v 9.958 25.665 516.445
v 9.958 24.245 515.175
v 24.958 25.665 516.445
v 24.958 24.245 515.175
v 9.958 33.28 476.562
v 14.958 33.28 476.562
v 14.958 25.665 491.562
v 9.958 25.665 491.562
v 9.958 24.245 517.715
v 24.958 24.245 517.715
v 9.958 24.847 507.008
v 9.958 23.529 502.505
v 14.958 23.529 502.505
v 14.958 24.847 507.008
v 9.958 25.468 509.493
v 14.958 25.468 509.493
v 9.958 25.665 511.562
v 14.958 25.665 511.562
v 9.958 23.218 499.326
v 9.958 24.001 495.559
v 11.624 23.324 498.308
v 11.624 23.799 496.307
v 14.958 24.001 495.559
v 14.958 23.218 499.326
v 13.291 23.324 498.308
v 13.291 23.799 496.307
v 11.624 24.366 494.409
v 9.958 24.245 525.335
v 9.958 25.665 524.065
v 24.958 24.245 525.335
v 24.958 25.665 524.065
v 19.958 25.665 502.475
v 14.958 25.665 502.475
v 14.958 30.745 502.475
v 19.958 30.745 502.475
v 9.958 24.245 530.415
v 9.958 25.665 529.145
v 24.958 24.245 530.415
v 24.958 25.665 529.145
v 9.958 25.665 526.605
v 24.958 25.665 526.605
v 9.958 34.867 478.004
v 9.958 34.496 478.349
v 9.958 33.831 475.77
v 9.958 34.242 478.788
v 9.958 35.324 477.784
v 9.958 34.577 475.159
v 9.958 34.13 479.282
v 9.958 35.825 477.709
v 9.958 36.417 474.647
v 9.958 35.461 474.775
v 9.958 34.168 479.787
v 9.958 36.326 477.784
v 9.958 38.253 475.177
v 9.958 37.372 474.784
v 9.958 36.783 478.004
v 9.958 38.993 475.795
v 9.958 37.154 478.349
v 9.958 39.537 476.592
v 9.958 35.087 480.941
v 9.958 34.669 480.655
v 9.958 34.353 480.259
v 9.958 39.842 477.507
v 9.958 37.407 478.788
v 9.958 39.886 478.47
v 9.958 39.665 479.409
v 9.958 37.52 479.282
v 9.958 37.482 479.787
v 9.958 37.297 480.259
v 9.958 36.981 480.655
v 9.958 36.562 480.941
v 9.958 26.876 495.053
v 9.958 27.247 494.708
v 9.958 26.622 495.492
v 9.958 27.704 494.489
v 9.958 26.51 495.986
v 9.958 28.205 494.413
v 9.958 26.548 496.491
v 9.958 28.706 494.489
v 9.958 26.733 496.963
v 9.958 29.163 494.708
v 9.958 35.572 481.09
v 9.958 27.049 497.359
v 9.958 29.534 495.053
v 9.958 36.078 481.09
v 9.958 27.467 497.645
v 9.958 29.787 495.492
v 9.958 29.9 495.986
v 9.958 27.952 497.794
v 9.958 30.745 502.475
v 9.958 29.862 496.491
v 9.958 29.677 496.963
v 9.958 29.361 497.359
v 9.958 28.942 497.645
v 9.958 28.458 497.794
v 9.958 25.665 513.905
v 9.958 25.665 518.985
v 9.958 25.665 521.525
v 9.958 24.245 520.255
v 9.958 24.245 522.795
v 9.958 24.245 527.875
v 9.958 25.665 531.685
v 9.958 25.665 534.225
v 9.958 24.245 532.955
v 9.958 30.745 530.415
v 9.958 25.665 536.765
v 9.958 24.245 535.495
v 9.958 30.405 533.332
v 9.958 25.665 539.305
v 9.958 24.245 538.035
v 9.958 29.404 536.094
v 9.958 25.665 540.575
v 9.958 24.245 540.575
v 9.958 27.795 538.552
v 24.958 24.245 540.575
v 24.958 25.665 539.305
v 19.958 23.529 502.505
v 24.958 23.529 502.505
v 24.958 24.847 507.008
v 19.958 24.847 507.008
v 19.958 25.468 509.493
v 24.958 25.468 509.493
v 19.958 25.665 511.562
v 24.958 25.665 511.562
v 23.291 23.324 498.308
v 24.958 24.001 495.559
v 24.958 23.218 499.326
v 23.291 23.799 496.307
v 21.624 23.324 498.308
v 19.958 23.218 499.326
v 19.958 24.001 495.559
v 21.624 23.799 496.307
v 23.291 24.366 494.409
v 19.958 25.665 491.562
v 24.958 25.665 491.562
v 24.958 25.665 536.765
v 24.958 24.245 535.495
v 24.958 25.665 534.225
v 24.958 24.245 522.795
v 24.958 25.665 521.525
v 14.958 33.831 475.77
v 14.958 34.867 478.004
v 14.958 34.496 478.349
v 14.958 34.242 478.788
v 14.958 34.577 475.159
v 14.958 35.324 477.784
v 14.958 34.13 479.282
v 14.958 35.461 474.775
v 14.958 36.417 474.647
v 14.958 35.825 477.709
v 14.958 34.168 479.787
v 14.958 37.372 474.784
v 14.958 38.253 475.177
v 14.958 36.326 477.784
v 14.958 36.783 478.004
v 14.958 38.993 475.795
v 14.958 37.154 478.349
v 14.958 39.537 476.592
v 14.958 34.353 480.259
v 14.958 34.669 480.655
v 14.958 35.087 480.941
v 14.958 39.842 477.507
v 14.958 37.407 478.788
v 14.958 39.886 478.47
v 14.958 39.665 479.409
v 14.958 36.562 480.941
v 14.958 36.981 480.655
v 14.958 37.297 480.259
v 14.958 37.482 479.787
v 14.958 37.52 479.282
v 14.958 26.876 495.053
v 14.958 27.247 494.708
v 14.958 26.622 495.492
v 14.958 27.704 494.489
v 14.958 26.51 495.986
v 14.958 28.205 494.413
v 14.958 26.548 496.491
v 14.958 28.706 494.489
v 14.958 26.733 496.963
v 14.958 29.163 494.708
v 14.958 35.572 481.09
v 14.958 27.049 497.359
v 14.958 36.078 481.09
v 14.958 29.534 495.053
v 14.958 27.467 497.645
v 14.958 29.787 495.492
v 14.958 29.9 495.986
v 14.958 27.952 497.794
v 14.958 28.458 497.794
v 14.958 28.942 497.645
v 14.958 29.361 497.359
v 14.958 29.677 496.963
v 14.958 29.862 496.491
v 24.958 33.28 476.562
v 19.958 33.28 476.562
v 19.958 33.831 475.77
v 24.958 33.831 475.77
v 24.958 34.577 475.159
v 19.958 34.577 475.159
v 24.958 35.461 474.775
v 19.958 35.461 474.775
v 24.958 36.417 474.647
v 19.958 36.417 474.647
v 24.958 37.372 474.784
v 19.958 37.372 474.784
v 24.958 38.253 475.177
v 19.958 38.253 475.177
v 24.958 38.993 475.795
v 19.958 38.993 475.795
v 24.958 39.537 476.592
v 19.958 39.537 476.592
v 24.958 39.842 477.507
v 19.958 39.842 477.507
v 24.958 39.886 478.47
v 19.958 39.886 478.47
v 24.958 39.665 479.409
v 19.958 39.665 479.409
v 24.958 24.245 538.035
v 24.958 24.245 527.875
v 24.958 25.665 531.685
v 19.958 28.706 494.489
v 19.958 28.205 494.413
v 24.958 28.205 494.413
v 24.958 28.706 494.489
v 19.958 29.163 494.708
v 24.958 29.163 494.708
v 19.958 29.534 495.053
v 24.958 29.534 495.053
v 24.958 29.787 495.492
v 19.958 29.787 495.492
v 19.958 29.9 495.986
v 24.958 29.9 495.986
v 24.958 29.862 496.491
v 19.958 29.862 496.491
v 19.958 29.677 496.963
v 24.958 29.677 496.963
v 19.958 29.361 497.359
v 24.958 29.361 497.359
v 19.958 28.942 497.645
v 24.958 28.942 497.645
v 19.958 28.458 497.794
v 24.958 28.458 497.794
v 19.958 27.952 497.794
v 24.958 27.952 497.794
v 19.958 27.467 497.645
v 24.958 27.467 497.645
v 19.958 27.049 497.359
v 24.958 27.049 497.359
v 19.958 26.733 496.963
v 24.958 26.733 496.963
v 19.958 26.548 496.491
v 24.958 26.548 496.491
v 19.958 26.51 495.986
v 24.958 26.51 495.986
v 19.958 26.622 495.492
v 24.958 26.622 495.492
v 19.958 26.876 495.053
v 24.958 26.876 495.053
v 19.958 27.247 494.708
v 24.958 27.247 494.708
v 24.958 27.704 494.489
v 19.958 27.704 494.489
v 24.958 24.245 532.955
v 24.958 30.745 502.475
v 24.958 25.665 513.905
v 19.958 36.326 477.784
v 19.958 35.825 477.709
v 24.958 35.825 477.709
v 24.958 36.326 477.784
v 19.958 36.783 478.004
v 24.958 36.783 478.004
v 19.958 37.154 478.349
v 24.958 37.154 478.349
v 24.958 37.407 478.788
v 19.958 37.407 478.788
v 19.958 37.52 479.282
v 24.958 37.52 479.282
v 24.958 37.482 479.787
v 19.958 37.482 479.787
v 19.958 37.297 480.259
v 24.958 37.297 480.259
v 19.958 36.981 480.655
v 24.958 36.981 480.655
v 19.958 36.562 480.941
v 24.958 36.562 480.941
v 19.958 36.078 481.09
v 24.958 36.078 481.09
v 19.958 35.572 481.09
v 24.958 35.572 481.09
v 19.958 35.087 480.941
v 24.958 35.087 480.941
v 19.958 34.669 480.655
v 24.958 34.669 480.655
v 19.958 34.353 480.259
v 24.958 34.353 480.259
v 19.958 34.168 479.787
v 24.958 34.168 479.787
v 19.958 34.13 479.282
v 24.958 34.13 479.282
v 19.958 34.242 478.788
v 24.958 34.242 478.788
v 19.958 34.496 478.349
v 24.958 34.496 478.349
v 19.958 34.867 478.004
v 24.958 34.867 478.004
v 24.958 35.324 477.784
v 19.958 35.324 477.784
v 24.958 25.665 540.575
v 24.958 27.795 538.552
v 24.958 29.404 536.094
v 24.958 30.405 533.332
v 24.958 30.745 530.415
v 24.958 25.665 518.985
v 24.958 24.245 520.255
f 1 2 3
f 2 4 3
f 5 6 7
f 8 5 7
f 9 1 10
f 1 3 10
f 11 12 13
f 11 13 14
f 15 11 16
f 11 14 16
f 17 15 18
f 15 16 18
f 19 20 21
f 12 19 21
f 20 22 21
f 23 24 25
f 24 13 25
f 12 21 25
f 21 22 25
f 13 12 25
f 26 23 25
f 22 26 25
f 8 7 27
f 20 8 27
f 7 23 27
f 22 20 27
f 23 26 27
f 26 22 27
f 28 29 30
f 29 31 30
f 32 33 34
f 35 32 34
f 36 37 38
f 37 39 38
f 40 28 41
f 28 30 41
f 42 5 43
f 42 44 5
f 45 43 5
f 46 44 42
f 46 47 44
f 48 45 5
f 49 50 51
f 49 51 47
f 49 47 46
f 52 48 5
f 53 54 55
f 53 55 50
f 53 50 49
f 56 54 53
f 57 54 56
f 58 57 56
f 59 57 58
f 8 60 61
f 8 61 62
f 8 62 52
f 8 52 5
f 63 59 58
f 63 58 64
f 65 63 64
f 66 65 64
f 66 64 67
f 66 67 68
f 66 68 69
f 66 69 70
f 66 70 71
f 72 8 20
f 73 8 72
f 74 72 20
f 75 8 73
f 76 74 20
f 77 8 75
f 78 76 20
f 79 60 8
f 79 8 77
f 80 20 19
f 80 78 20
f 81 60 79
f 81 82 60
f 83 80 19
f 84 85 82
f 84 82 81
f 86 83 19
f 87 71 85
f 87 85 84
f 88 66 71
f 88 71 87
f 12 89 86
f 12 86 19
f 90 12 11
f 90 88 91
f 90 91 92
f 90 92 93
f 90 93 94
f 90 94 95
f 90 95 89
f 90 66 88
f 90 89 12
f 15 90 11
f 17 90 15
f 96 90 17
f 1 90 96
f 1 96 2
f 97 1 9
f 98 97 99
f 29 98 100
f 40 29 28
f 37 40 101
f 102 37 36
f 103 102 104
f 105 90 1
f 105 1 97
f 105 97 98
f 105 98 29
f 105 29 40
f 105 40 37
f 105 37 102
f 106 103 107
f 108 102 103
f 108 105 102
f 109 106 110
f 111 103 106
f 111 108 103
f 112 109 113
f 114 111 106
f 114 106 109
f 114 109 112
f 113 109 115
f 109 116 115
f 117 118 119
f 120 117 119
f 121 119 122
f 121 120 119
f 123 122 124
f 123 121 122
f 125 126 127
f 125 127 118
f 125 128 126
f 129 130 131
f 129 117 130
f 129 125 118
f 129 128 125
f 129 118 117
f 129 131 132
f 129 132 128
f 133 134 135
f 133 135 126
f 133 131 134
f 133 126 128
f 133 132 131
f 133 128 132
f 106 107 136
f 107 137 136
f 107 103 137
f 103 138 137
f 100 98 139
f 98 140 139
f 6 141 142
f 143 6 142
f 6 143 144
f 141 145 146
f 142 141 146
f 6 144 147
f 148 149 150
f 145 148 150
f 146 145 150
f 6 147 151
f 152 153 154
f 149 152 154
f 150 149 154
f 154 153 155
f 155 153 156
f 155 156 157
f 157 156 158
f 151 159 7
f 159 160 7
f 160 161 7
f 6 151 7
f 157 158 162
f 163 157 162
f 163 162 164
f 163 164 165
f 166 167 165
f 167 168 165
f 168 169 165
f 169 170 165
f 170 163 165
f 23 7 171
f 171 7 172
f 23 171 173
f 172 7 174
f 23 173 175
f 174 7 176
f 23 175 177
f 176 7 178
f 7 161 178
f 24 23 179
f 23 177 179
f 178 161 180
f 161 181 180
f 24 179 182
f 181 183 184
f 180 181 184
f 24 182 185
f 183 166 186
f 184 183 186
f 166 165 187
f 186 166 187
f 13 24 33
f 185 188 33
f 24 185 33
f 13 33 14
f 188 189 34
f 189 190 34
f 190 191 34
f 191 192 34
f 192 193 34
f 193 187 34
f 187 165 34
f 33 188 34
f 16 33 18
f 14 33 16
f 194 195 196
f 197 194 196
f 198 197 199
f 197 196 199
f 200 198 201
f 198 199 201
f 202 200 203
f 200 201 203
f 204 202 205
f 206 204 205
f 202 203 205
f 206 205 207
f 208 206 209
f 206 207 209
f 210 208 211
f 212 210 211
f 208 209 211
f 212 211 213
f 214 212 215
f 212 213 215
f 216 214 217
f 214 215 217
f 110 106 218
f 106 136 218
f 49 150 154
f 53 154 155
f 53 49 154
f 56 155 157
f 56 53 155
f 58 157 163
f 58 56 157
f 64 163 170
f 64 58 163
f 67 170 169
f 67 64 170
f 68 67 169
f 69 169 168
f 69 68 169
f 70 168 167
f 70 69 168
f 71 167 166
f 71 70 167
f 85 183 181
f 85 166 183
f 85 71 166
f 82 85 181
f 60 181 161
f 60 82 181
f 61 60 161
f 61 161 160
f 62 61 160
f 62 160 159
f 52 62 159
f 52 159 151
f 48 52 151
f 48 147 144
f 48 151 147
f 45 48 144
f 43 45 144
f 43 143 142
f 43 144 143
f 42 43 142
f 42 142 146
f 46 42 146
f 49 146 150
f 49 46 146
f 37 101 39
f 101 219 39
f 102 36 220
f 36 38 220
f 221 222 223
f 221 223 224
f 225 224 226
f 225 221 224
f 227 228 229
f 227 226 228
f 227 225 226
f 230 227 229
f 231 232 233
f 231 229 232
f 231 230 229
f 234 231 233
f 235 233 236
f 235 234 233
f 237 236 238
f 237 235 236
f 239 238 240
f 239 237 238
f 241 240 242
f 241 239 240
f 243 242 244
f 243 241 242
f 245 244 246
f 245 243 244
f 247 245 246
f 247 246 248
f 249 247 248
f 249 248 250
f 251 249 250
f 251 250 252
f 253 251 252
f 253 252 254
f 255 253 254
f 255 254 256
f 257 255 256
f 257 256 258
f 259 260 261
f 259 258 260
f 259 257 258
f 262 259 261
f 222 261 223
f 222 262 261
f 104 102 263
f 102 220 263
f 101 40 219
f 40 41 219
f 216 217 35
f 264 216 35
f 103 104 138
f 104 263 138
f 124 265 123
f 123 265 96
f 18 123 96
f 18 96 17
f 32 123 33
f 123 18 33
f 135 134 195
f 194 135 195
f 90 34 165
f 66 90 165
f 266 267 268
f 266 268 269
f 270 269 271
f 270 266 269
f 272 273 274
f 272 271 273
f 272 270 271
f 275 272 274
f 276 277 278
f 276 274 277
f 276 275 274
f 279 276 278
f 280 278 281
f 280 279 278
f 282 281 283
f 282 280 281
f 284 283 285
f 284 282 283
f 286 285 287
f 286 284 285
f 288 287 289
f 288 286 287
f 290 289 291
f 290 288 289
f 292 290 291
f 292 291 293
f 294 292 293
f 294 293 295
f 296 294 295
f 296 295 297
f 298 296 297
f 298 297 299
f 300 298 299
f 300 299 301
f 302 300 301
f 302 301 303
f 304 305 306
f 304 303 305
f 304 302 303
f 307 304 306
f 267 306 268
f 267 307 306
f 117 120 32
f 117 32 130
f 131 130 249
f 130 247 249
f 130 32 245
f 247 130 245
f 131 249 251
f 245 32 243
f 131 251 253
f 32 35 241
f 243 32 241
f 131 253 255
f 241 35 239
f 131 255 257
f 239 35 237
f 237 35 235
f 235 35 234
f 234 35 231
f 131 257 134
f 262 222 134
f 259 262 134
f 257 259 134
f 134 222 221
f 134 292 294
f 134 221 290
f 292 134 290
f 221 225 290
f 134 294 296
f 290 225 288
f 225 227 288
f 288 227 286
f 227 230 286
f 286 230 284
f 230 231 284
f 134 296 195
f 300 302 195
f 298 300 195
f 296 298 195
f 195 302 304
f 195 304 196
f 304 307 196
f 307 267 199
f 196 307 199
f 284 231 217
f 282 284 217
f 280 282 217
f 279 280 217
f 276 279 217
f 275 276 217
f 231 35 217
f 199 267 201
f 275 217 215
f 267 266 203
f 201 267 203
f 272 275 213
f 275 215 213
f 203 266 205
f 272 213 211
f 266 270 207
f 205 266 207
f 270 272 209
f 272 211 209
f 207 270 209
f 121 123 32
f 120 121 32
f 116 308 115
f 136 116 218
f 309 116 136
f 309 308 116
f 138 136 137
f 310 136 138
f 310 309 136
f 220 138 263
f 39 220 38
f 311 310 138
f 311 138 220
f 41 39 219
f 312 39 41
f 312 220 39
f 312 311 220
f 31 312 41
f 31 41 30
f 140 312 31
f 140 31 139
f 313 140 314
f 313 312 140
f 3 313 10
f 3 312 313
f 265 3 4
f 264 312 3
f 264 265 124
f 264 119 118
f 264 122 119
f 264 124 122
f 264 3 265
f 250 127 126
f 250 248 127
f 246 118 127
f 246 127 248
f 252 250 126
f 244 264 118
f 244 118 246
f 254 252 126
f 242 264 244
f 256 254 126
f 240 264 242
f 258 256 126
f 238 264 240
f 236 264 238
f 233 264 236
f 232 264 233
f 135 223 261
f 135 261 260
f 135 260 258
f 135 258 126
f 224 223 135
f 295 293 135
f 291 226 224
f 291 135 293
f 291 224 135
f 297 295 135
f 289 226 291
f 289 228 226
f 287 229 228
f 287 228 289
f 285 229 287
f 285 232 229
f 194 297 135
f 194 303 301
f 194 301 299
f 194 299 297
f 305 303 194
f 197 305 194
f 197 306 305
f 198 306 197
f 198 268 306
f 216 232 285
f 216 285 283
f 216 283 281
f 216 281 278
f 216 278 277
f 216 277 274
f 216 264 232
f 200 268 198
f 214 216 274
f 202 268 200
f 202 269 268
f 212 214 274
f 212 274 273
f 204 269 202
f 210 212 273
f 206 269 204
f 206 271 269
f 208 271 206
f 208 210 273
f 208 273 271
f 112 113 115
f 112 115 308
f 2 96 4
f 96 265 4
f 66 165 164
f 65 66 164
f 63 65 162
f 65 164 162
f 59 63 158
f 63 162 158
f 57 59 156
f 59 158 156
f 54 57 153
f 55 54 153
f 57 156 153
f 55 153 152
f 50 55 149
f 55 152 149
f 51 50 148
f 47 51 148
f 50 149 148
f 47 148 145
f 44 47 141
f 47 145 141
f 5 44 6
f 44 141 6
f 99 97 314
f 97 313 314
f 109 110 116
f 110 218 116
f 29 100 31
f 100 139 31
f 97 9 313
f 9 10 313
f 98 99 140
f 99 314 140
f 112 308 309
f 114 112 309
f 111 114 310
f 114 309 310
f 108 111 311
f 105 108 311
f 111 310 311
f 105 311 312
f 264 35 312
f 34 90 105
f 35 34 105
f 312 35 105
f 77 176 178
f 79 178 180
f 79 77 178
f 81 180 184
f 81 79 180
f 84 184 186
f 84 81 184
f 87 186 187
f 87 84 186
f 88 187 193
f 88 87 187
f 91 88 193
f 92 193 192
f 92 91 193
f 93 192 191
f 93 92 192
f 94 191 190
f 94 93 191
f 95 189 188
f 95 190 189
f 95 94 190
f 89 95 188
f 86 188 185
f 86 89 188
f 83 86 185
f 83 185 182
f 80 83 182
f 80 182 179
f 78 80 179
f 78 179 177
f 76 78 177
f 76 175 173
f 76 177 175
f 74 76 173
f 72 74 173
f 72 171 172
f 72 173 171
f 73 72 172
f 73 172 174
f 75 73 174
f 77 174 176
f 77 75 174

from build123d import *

# Parameters (mm, degrees)
BOSS_EXTRUDE1_DEPTH = 2.54
BOSS_EXTRUDE2_DEPTH = 8.08
BOSS_EXTRUDE3_START = -5
BOSS_EXTRUDE3_DEPTH = 5
BOSS_EXTRUDE4_START = 5
BOSS_EXTRUDE4_DEPTH = 5
SKETCH8_R           = 1.7
CUT_EXTRUDE1_DEPTH  = 543.252698287


with BuildPart() as part:
    # Sketch1 → Boss-Extrude1 (new body)
    with BuildSketch(Plane(origin=(14.957777778, 0, 0), x_dir=(0, 0, -1), z_dir=(1, 0, 0))):
        with BuildLine():
            Line((-496.113012561, 30.744895578), (-521.513012561, 30.744895578))
            Line((-521.513012561, 30.744895578), (-521.513012561, 25.664895578))
            Line((-521.513012561, 25.664895578), (-496.113012561, 25.664895578))
            ThreePointArc((-496.113012561, 25.664895578), (-494.404850963, 26.325059427), (-493.584615771, 27.962388527))
            Line((-493.584615771, 27.962388527), (-480.88314332, 33.756493956))
            ThreePointArc((-480.88314332, 33.756493956), (-477.098018282, 36.879077411), (-481.937324449, 36.067403333))
            Line((-481.937324449, 36.067403333), (-494.6387969, 30.273297904))
            ThreePointArc((-494.6387969, 30.273297904), (-495.339107499, 30.624124991), (-496.113012561, 30.744895578))
        make_face()
    extrude(amount=-BOSS_EXTRUDE1_DEPTH)

    # Sketch2 → Boss-Extrude2 (add)
    with BuildSketch(Plane(origin=(14.957777778, 0, 0), x_dir=(0, 0, -1), z_dir=(1, 0, 0))):
        with BuildLine():
            Line((-513.904615771, 25.664895578), (-502.474615771, 25.664895578))
            Line((-502.474615771, 25.664895578), (-502.474615771, 30.744895578))
            Line((-502.474615771, 30.744895578), (-530.414615771, 30.744895578))
            ThreePointArc((-530.414615771, 30.744895578), (-536.094228434, 29.404120904), (-540.574615771, 25.664895578))
            Line((-540.574615771, 25.664895578), (-540.574615771, 24.244992412))
            Line((-540.574615771, 24.244992412), (-539.304615771, 25.664895578))
            Line((-539.304615771, 25.664895578), (-538.034615771, 24.244992412))
            Line((-538.034615771, 24.244992412), (-536.764615771, 25.664895578))
            Line((-536.764615771, 25.664895578), (-535.494615771, 24.244992412))
            Line((-535.494615771, 24.244992412), (-534.224615771, 25.664895578))
            Line((-534.224615771, 25.664895578), (-532.954615771, 24.244992412))
            Line((-532.954615771, 24.244992412), (-531.684615771, 25.664895578))
            Line((-531.684615771, 25.664895578), (-530.414615771, 24.244992412))
            Line((-530.414615771, 24.244992412), (-529.144615771, 25.664895578))
            Line((-529.144615771, 25.664895578), (-527.874615771, 24.244992412))
            Line((-527.874615771, 24.244992412), (-526.604615771, 25.664895578))
            Line((-526.604615771, 25.664895578), (-525.334615771, 24.244992412))
            Line((-525.334615771, 24.244992412), (-524.064615771, 25.664895578))
            Line((-524.064615771, 25.664895578), (-522.794615771, 24.244992412))
            Line((-522.794615771, 24.244992412), (-521.524615771, 25.664895578))
            Line((-521.524615771, 25.664895578), (-520.254615771, 24.244992412))
            Line((-520.254615771, 24.244992412), (-518.984615771, 25.664895578))
            Line((-518.984615771, 25.664895578), (-517.714615771, 24.244992412))
            Line((-517.714615771, 24.244992412), (-516.444615771, 25.664895578))
            Line((-516.444615771, 25.664895578), (-515.174615771, 24.244992412))
            Line((-515.174615771, 24.244992412), (-513.904615771, 25.664895578))
        make_face()
    extrude(amount=BOSS_EXTRUDE2_DEPTH)

    # Sketch7 → Boss-Extrude3 (add)
    with BuildSketch(Plane(origin=(14.957777778, 0, 0), x_dir=(0, 0, -1), z_dir=(1, 0, 0)).offset(BOSS_EXTRUDE3_START)):
        with BuildLine():
            Line((-502.474615771, 30.744895578), (-479.408927659, 39.66518211))
            ThreePointArc((-479.408927659, 39.66518211), (-474.949798497, 37.8260107), (-476.562112461, 33.279932386))
            Line((-476.562112461, 33.279932386), (-491.562112461, 25.664895578))
            add(Edge.make_bspline(
                [(-491.562112461, 25.664895578), (-494.237137805, 24.306867814), (-495.170436648, 24.128959325), (-502.31030057, 22.103673482), (-507.062112461, 25.664895578), (-511.562112461, 25.664895578)],
                knots=[0, 0, 0, 0, 0.24107407, 0.34107407, 1, 1, 1, 1], degree=3))
            Line((-511.562112461, 25.664895578), (-513.904615771, 25.664895578))
            Line((-513.904615771, 25.664895578), (-515.174615771, 24.244992412))
            Line((-515.174615771, 24.244992412), (-516.444615771, 25.664895578))
            Line((-516.444615771, 25.664895578), (-517.714615771, 24.244992412))
            Line((-517.714615771, 24.244992412), (-518.984615771, 25.664895578))
            Line((-518.984615771, 25.664895578), (-520.254615771, 24.244992412))
            Line((-520.254615771, 24.244992412), (-521.524615771, 25.664895578))
            Line((-521.524615771, 25.664895578), (-522.794615771, 24.244992412))
            Line((-522.794615771, 24.244992412), (-524.064615771, 25.664895578))
            Line((-524.064615771, 25.664895578), (-525.334615771, 24.244992412))
            Line((-525.334615771, 24.244992412), (-526.604615771, 25.664895578))
            Line((-526.604615771, 25.664895578), (-527.874615771, 24.244992412))
            Line((-527.874615771, 24.244992412), (-529.144615771, 25.664895578))
            Line((-529.144615771, 25.664895578), (-530.414615771, 24.244992412))
            Line((-530.414615771, 24.244992412), (-531.684615771, 25.664895578))
            Line((-531.684615771, 25.664895578), (-532.954615771, 24.244992412))
            Line((-532.954615771, 24.244992412), (-534.224615771, 25.664895578))
            Line((-534.224615771, 25.664895578), (-535.494615771, 24.244992412))
            Line((-535.494615771, 24.244992412), (-536.764615771, 25.664895578))
            Line((-536.764615771, 25.664895578), (-538.034615771, 24.244992412))
            Line((-538.034615771, 24.244992412), (-539.304615771, 25.664895578))
            Line((-539.304615771, 25.664895578), (-540.574615771, 24.244992412))
            Line((-540.574615771, 24.244992412), (-540.574615771, 25.664895578))
            ThreePointArc((-540.574615771, 25.664895578), (-536.094228434, 29.404120904), (-530.414615771, 30.744895578))
            Line((-530.414615771, 30.744895578), (-502.474615771, 30.744895578))
        make_face()
    extrude(amount=BOSS_EXTRUDE3_DEPTH)

    # Sketch7_2 → Boss-Extrude4 (add)
    with BuildSketch(Plane(origin=(14.957777778, 0, 0), x_dir=(0, 0, -1), z_dir=(1, 0, 0)).offset(BOSS_EXTRUDE4_START)):
        with BuildLine():
            Line((-502.474615771, 25.664895578), (-502.474615771, 30.744895578))
            Line((-502.474615771, 30.744895578), (-530.414615771, 30.744895578))
            ThreePointArc((-530.414615771, 30.744895578), (-536.094228434, 29.404120904), (-540.574615771, 25.664895578))
            Line((-540.574615771, 25.664895578), (-540.574615771, 24.244992412))
            Line((-540.574615771, 24.244992412), (-539.304615771, 25.664895578))
            Line((-539.304615771, 25.664895578), (-538.034615771, 24.244992412))
            Line((-538.034615771, 24.244992412), (-536.764615771, 25.664895578))
            Line((-536.764615771, 25.664895578), (-535.494615771, 24.244992412))
            Line((-535.494615771, 24.244992412), (-534.224615771, 25.664895578))
            Line((-534.224615771, 25.664895578), (-532.954615771, 24.244992412))
            Line((-532.954615771, 24.244992412), (-531.684615771, 25.664895578))
            Line((-531.684615771, 25.664895578), (-530.414615771, 24.244992412))
            Line((-530.414615771, 24.244992412), (-529.144615771, 25.664895578))
            Line((-529.144615771, 25.664895578), (-527.874615771, 24.244992412))
            Line((-527.874615771, 24.244992412), (-526.604615771, 25.664895578))
            Line((-526.604615771, 25.664895578), (-525.334615771, 24.244992412))
            Line((-525.334615771, 24.244992412), (-524.064615771, 25.664895578))
            Line((-524.064615771, 25.664895578), (-522.794615771, 24.244992412))
            Line((-522.794615771, 24.244992412), (-521.524615771, 25.664895578))
            Line((-521.524615771, 25.664895578), (-520.254615771, 24.244992412))
            Line((-520.254615771, 24.244992412), (-518.984615771, 25.664895578))
            Line((-518.984615771, 25.664895578), (-517.714615771, 24.244992412))
            Line((-517.714615771, 24.244992412), (-516.444615771, 25.664895578))
            Line((-516.444615771, 25.664895578), (-515.174615771, 24.244992412))
            Line((-515.174615771, 24.244992412), (-513.904615771, 25.664895578))
            Line((-513.904615771, 25.664895578), (-511.562112461, 25.664895578))
            Line((-511.562112461, 25.664895578), (-502.474615771, 25.664895578))
        make_face()
        with BuildLine():
            Line((-479.408927659, 39.66518211), (-502.474615771, 30.744895578))
            Line((-502.474615771, 30.744895578), (-502.474615771, 25.664895578))
            Line((-502.474615771, 25.664895578), (-511.562112461, 25.664895578))
            add(Edge.make_bspline(
                [(-491.562112461, 25.664895578), (-494.237137805, 24.306867814), (-495.170436648, 24.128959325), (-502.31030057, 22.103673482), (-507.062112461, 25.664895578), (-511.562112461, 25.664895578)],
                knots=[0, 0, 0, 0, 0.24107407, 0.34107407, 1, 1, 1, 1], degree=3))
            Line((-491.562112461, 25.664895578), (-476.562112461, 33.279932386))
            ThreePointArc((-476.562112461, 33.279932386), (-474.949798497, 37.8260107), (-479.408927659, 39.66518211))
        make_face()
    extrude(amount=BOSS_EXTRUDE4_DEPTH)

    # Sketch8 → Cut-Extrude1 (cut, through all)
    with BuildSketch(Plane(origin=(9.957777778, 0, 0), x_dir=(0, 0, -1), z_dir=(1, 0, 0))):
        with Locations((-496.113012561, 28.204895578)):
            Circle(SKETCH8_R)
        with Locations((-479.408927659, 35.824896282)):
            Circle(SKETCH8_R)
    extrude(amount=CUT_EXTRUDE1_DEPTH, mode=Mode.SUBTRACT)


solid = part.part
